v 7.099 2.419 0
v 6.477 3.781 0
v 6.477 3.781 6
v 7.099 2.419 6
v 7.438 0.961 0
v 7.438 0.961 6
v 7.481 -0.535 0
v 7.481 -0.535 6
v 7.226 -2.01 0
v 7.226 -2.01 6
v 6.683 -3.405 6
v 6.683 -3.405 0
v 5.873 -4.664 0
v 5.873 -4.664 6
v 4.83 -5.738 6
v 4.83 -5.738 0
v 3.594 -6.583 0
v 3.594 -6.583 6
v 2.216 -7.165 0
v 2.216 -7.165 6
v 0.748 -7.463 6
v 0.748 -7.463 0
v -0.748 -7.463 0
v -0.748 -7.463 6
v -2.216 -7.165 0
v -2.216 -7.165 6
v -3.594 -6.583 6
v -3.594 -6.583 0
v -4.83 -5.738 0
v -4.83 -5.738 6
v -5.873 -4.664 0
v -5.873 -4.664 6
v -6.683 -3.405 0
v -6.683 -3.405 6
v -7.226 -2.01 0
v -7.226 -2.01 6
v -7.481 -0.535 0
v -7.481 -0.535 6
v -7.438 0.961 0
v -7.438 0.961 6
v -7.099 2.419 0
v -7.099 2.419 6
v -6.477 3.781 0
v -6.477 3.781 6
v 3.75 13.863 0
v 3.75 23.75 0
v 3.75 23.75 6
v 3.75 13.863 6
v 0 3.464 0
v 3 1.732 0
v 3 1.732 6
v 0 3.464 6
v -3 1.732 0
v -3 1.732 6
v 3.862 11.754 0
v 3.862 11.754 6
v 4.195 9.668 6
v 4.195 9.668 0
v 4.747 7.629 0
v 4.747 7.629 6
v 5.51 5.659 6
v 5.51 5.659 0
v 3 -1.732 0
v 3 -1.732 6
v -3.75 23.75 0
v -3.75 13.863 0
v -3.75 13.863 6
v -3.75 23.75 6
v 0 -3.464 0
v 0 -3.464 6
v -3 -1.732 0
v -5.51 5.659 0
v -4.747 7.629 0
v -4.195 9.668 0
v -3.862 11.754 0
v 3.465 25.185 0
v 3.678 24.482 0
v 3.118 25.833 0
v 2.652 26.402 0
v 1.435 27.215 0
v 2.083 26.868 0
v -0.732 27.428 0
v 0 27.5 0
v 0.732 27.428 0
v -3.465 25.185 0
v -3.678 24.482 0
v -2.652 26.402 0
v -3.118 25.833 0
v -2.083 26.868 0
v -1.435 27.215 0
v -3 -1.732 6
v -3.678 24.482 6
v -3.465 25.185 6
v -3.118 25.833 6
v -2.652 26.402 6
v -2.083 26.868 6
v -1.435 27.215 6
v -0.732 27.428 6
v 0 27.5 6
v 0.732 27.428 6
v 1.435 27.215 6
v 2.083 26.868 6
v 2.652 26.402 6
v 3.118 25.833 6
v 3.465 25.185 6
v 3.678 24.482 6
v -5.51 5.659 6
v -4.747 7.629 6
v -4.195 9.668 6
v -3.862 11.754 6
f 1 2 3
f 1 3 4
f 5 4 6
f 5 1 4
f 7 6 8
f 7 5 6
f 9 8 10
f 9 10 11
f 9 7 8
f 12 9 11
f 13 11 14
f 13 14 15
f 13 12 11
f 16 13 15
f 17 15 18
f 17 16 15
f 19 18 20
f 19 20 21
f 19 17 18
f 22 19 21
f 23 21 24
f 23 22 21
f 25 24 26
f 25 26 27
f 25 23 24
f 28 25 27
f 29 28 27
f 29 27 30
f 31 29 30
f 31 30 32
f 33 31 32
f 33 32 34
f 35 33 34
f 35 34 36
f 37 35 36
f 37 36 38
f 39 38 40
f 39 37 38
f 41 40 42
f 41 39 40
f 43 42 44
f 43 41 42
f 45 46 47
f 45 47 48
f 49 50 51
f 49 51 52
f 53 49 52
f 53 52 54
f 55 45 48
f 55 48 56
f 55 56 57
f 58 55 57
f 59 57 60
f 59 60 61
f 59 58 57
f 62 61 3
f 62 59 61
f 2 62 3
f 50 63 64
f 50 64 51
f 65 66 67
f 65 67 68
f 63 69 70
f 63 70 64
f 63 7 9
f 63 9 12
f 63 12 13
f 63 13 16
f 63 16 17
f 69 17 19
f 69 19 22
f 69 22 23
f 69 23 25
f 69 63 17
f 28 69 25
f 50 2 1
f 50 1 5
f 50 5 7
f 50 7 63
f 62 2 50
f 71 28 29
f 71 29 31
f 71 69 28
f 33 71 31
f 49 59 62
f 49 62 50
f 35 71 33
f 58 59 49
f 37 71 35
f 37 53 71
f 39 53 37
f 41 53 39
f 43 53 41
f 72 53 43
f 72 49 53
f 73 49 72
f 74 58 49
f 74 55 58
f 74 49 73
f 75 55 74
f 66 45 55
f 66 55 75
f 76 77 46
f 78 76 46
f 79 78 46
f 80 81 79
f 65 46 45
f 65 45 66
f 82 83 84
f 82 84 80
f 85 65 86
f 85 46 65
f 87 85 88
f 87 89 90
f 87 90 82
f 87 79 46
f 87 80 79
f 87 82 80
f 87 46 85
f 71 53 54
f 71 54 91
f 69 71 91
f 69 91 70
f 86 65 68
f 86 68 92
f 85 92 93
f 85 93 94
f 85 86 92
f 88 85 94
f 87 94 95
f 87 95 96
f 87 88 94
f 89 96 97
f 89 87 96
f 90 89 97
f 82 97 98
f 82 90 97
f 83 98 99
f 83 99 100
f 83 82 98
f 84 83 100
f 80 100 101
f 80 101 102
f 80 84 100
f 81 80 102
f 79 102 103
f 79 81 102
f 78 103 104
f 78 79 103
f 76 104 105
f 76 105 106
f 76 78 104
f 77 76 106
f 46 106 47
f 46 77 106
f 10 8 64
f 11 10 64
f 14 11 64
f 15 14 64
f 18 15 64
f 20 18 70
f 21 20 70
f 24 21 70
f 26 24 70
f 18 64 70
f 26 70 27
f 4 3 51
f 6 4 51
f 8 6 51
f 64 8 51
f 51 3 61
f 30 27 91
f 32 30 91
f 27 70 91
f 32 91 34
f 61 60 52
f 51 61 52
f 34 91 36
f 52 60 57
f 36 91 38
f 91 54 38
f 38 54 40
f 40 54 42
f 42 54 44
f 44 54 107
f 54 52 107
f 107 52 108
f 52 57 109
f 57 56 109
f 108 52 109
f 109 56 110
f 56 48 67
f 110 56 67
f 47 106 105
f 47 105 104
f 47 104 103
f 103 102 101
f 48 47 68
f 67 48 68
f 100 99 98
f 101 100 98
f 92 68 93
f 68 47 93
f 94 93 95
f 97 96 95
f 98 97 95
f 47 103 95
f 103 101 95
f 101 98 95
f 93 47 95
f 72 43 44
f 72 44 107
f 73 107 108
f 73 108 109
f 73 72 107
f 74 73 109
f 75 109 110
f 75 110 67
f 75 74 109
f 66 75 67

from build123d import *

# Parameters (mm, degrees)
BOSS_EXTRUDE1_DEPTH = 6


with BuildPart() as part:
    # Sketch1 → Boss-Extrude1 (new body)
    with BuildSketch(Plane.XY):
        with BuildLine():
            Line((-3.75, 13.863170633), (-3.75, 23.75))
            ThreePointArc((-3.75, 23.75), (0, 27.5), (3.75, 23.75))
            Line((3.75, 23.75), (3.75, 13.863170633))
            ThreePointArc((3.75, 13.863170633), (4.443854017, 8.640840954), (6.477272727, 3.780864718))
            ThreePointArc((6.477272727, 3.780864718), (0, -7.5), (-6.477272727, 3.780864718))
            ThreePointArc((-6.477272727, 3.780864718), (-4.443854017, 8.640840954), (-3.75, 13.863170633))
        make_face()
        Polygon((0, 3.464101615), (-3, 1.732050808), (-3, -1.732050808), (0, -3.464101615), (3, -1.732050808), (3, 1.732050808), align=None, mode=Mode.SUBTRACT)
    extrude(amount=BOSS_EXTRUDE1_DEPTH)


solid = part.part
